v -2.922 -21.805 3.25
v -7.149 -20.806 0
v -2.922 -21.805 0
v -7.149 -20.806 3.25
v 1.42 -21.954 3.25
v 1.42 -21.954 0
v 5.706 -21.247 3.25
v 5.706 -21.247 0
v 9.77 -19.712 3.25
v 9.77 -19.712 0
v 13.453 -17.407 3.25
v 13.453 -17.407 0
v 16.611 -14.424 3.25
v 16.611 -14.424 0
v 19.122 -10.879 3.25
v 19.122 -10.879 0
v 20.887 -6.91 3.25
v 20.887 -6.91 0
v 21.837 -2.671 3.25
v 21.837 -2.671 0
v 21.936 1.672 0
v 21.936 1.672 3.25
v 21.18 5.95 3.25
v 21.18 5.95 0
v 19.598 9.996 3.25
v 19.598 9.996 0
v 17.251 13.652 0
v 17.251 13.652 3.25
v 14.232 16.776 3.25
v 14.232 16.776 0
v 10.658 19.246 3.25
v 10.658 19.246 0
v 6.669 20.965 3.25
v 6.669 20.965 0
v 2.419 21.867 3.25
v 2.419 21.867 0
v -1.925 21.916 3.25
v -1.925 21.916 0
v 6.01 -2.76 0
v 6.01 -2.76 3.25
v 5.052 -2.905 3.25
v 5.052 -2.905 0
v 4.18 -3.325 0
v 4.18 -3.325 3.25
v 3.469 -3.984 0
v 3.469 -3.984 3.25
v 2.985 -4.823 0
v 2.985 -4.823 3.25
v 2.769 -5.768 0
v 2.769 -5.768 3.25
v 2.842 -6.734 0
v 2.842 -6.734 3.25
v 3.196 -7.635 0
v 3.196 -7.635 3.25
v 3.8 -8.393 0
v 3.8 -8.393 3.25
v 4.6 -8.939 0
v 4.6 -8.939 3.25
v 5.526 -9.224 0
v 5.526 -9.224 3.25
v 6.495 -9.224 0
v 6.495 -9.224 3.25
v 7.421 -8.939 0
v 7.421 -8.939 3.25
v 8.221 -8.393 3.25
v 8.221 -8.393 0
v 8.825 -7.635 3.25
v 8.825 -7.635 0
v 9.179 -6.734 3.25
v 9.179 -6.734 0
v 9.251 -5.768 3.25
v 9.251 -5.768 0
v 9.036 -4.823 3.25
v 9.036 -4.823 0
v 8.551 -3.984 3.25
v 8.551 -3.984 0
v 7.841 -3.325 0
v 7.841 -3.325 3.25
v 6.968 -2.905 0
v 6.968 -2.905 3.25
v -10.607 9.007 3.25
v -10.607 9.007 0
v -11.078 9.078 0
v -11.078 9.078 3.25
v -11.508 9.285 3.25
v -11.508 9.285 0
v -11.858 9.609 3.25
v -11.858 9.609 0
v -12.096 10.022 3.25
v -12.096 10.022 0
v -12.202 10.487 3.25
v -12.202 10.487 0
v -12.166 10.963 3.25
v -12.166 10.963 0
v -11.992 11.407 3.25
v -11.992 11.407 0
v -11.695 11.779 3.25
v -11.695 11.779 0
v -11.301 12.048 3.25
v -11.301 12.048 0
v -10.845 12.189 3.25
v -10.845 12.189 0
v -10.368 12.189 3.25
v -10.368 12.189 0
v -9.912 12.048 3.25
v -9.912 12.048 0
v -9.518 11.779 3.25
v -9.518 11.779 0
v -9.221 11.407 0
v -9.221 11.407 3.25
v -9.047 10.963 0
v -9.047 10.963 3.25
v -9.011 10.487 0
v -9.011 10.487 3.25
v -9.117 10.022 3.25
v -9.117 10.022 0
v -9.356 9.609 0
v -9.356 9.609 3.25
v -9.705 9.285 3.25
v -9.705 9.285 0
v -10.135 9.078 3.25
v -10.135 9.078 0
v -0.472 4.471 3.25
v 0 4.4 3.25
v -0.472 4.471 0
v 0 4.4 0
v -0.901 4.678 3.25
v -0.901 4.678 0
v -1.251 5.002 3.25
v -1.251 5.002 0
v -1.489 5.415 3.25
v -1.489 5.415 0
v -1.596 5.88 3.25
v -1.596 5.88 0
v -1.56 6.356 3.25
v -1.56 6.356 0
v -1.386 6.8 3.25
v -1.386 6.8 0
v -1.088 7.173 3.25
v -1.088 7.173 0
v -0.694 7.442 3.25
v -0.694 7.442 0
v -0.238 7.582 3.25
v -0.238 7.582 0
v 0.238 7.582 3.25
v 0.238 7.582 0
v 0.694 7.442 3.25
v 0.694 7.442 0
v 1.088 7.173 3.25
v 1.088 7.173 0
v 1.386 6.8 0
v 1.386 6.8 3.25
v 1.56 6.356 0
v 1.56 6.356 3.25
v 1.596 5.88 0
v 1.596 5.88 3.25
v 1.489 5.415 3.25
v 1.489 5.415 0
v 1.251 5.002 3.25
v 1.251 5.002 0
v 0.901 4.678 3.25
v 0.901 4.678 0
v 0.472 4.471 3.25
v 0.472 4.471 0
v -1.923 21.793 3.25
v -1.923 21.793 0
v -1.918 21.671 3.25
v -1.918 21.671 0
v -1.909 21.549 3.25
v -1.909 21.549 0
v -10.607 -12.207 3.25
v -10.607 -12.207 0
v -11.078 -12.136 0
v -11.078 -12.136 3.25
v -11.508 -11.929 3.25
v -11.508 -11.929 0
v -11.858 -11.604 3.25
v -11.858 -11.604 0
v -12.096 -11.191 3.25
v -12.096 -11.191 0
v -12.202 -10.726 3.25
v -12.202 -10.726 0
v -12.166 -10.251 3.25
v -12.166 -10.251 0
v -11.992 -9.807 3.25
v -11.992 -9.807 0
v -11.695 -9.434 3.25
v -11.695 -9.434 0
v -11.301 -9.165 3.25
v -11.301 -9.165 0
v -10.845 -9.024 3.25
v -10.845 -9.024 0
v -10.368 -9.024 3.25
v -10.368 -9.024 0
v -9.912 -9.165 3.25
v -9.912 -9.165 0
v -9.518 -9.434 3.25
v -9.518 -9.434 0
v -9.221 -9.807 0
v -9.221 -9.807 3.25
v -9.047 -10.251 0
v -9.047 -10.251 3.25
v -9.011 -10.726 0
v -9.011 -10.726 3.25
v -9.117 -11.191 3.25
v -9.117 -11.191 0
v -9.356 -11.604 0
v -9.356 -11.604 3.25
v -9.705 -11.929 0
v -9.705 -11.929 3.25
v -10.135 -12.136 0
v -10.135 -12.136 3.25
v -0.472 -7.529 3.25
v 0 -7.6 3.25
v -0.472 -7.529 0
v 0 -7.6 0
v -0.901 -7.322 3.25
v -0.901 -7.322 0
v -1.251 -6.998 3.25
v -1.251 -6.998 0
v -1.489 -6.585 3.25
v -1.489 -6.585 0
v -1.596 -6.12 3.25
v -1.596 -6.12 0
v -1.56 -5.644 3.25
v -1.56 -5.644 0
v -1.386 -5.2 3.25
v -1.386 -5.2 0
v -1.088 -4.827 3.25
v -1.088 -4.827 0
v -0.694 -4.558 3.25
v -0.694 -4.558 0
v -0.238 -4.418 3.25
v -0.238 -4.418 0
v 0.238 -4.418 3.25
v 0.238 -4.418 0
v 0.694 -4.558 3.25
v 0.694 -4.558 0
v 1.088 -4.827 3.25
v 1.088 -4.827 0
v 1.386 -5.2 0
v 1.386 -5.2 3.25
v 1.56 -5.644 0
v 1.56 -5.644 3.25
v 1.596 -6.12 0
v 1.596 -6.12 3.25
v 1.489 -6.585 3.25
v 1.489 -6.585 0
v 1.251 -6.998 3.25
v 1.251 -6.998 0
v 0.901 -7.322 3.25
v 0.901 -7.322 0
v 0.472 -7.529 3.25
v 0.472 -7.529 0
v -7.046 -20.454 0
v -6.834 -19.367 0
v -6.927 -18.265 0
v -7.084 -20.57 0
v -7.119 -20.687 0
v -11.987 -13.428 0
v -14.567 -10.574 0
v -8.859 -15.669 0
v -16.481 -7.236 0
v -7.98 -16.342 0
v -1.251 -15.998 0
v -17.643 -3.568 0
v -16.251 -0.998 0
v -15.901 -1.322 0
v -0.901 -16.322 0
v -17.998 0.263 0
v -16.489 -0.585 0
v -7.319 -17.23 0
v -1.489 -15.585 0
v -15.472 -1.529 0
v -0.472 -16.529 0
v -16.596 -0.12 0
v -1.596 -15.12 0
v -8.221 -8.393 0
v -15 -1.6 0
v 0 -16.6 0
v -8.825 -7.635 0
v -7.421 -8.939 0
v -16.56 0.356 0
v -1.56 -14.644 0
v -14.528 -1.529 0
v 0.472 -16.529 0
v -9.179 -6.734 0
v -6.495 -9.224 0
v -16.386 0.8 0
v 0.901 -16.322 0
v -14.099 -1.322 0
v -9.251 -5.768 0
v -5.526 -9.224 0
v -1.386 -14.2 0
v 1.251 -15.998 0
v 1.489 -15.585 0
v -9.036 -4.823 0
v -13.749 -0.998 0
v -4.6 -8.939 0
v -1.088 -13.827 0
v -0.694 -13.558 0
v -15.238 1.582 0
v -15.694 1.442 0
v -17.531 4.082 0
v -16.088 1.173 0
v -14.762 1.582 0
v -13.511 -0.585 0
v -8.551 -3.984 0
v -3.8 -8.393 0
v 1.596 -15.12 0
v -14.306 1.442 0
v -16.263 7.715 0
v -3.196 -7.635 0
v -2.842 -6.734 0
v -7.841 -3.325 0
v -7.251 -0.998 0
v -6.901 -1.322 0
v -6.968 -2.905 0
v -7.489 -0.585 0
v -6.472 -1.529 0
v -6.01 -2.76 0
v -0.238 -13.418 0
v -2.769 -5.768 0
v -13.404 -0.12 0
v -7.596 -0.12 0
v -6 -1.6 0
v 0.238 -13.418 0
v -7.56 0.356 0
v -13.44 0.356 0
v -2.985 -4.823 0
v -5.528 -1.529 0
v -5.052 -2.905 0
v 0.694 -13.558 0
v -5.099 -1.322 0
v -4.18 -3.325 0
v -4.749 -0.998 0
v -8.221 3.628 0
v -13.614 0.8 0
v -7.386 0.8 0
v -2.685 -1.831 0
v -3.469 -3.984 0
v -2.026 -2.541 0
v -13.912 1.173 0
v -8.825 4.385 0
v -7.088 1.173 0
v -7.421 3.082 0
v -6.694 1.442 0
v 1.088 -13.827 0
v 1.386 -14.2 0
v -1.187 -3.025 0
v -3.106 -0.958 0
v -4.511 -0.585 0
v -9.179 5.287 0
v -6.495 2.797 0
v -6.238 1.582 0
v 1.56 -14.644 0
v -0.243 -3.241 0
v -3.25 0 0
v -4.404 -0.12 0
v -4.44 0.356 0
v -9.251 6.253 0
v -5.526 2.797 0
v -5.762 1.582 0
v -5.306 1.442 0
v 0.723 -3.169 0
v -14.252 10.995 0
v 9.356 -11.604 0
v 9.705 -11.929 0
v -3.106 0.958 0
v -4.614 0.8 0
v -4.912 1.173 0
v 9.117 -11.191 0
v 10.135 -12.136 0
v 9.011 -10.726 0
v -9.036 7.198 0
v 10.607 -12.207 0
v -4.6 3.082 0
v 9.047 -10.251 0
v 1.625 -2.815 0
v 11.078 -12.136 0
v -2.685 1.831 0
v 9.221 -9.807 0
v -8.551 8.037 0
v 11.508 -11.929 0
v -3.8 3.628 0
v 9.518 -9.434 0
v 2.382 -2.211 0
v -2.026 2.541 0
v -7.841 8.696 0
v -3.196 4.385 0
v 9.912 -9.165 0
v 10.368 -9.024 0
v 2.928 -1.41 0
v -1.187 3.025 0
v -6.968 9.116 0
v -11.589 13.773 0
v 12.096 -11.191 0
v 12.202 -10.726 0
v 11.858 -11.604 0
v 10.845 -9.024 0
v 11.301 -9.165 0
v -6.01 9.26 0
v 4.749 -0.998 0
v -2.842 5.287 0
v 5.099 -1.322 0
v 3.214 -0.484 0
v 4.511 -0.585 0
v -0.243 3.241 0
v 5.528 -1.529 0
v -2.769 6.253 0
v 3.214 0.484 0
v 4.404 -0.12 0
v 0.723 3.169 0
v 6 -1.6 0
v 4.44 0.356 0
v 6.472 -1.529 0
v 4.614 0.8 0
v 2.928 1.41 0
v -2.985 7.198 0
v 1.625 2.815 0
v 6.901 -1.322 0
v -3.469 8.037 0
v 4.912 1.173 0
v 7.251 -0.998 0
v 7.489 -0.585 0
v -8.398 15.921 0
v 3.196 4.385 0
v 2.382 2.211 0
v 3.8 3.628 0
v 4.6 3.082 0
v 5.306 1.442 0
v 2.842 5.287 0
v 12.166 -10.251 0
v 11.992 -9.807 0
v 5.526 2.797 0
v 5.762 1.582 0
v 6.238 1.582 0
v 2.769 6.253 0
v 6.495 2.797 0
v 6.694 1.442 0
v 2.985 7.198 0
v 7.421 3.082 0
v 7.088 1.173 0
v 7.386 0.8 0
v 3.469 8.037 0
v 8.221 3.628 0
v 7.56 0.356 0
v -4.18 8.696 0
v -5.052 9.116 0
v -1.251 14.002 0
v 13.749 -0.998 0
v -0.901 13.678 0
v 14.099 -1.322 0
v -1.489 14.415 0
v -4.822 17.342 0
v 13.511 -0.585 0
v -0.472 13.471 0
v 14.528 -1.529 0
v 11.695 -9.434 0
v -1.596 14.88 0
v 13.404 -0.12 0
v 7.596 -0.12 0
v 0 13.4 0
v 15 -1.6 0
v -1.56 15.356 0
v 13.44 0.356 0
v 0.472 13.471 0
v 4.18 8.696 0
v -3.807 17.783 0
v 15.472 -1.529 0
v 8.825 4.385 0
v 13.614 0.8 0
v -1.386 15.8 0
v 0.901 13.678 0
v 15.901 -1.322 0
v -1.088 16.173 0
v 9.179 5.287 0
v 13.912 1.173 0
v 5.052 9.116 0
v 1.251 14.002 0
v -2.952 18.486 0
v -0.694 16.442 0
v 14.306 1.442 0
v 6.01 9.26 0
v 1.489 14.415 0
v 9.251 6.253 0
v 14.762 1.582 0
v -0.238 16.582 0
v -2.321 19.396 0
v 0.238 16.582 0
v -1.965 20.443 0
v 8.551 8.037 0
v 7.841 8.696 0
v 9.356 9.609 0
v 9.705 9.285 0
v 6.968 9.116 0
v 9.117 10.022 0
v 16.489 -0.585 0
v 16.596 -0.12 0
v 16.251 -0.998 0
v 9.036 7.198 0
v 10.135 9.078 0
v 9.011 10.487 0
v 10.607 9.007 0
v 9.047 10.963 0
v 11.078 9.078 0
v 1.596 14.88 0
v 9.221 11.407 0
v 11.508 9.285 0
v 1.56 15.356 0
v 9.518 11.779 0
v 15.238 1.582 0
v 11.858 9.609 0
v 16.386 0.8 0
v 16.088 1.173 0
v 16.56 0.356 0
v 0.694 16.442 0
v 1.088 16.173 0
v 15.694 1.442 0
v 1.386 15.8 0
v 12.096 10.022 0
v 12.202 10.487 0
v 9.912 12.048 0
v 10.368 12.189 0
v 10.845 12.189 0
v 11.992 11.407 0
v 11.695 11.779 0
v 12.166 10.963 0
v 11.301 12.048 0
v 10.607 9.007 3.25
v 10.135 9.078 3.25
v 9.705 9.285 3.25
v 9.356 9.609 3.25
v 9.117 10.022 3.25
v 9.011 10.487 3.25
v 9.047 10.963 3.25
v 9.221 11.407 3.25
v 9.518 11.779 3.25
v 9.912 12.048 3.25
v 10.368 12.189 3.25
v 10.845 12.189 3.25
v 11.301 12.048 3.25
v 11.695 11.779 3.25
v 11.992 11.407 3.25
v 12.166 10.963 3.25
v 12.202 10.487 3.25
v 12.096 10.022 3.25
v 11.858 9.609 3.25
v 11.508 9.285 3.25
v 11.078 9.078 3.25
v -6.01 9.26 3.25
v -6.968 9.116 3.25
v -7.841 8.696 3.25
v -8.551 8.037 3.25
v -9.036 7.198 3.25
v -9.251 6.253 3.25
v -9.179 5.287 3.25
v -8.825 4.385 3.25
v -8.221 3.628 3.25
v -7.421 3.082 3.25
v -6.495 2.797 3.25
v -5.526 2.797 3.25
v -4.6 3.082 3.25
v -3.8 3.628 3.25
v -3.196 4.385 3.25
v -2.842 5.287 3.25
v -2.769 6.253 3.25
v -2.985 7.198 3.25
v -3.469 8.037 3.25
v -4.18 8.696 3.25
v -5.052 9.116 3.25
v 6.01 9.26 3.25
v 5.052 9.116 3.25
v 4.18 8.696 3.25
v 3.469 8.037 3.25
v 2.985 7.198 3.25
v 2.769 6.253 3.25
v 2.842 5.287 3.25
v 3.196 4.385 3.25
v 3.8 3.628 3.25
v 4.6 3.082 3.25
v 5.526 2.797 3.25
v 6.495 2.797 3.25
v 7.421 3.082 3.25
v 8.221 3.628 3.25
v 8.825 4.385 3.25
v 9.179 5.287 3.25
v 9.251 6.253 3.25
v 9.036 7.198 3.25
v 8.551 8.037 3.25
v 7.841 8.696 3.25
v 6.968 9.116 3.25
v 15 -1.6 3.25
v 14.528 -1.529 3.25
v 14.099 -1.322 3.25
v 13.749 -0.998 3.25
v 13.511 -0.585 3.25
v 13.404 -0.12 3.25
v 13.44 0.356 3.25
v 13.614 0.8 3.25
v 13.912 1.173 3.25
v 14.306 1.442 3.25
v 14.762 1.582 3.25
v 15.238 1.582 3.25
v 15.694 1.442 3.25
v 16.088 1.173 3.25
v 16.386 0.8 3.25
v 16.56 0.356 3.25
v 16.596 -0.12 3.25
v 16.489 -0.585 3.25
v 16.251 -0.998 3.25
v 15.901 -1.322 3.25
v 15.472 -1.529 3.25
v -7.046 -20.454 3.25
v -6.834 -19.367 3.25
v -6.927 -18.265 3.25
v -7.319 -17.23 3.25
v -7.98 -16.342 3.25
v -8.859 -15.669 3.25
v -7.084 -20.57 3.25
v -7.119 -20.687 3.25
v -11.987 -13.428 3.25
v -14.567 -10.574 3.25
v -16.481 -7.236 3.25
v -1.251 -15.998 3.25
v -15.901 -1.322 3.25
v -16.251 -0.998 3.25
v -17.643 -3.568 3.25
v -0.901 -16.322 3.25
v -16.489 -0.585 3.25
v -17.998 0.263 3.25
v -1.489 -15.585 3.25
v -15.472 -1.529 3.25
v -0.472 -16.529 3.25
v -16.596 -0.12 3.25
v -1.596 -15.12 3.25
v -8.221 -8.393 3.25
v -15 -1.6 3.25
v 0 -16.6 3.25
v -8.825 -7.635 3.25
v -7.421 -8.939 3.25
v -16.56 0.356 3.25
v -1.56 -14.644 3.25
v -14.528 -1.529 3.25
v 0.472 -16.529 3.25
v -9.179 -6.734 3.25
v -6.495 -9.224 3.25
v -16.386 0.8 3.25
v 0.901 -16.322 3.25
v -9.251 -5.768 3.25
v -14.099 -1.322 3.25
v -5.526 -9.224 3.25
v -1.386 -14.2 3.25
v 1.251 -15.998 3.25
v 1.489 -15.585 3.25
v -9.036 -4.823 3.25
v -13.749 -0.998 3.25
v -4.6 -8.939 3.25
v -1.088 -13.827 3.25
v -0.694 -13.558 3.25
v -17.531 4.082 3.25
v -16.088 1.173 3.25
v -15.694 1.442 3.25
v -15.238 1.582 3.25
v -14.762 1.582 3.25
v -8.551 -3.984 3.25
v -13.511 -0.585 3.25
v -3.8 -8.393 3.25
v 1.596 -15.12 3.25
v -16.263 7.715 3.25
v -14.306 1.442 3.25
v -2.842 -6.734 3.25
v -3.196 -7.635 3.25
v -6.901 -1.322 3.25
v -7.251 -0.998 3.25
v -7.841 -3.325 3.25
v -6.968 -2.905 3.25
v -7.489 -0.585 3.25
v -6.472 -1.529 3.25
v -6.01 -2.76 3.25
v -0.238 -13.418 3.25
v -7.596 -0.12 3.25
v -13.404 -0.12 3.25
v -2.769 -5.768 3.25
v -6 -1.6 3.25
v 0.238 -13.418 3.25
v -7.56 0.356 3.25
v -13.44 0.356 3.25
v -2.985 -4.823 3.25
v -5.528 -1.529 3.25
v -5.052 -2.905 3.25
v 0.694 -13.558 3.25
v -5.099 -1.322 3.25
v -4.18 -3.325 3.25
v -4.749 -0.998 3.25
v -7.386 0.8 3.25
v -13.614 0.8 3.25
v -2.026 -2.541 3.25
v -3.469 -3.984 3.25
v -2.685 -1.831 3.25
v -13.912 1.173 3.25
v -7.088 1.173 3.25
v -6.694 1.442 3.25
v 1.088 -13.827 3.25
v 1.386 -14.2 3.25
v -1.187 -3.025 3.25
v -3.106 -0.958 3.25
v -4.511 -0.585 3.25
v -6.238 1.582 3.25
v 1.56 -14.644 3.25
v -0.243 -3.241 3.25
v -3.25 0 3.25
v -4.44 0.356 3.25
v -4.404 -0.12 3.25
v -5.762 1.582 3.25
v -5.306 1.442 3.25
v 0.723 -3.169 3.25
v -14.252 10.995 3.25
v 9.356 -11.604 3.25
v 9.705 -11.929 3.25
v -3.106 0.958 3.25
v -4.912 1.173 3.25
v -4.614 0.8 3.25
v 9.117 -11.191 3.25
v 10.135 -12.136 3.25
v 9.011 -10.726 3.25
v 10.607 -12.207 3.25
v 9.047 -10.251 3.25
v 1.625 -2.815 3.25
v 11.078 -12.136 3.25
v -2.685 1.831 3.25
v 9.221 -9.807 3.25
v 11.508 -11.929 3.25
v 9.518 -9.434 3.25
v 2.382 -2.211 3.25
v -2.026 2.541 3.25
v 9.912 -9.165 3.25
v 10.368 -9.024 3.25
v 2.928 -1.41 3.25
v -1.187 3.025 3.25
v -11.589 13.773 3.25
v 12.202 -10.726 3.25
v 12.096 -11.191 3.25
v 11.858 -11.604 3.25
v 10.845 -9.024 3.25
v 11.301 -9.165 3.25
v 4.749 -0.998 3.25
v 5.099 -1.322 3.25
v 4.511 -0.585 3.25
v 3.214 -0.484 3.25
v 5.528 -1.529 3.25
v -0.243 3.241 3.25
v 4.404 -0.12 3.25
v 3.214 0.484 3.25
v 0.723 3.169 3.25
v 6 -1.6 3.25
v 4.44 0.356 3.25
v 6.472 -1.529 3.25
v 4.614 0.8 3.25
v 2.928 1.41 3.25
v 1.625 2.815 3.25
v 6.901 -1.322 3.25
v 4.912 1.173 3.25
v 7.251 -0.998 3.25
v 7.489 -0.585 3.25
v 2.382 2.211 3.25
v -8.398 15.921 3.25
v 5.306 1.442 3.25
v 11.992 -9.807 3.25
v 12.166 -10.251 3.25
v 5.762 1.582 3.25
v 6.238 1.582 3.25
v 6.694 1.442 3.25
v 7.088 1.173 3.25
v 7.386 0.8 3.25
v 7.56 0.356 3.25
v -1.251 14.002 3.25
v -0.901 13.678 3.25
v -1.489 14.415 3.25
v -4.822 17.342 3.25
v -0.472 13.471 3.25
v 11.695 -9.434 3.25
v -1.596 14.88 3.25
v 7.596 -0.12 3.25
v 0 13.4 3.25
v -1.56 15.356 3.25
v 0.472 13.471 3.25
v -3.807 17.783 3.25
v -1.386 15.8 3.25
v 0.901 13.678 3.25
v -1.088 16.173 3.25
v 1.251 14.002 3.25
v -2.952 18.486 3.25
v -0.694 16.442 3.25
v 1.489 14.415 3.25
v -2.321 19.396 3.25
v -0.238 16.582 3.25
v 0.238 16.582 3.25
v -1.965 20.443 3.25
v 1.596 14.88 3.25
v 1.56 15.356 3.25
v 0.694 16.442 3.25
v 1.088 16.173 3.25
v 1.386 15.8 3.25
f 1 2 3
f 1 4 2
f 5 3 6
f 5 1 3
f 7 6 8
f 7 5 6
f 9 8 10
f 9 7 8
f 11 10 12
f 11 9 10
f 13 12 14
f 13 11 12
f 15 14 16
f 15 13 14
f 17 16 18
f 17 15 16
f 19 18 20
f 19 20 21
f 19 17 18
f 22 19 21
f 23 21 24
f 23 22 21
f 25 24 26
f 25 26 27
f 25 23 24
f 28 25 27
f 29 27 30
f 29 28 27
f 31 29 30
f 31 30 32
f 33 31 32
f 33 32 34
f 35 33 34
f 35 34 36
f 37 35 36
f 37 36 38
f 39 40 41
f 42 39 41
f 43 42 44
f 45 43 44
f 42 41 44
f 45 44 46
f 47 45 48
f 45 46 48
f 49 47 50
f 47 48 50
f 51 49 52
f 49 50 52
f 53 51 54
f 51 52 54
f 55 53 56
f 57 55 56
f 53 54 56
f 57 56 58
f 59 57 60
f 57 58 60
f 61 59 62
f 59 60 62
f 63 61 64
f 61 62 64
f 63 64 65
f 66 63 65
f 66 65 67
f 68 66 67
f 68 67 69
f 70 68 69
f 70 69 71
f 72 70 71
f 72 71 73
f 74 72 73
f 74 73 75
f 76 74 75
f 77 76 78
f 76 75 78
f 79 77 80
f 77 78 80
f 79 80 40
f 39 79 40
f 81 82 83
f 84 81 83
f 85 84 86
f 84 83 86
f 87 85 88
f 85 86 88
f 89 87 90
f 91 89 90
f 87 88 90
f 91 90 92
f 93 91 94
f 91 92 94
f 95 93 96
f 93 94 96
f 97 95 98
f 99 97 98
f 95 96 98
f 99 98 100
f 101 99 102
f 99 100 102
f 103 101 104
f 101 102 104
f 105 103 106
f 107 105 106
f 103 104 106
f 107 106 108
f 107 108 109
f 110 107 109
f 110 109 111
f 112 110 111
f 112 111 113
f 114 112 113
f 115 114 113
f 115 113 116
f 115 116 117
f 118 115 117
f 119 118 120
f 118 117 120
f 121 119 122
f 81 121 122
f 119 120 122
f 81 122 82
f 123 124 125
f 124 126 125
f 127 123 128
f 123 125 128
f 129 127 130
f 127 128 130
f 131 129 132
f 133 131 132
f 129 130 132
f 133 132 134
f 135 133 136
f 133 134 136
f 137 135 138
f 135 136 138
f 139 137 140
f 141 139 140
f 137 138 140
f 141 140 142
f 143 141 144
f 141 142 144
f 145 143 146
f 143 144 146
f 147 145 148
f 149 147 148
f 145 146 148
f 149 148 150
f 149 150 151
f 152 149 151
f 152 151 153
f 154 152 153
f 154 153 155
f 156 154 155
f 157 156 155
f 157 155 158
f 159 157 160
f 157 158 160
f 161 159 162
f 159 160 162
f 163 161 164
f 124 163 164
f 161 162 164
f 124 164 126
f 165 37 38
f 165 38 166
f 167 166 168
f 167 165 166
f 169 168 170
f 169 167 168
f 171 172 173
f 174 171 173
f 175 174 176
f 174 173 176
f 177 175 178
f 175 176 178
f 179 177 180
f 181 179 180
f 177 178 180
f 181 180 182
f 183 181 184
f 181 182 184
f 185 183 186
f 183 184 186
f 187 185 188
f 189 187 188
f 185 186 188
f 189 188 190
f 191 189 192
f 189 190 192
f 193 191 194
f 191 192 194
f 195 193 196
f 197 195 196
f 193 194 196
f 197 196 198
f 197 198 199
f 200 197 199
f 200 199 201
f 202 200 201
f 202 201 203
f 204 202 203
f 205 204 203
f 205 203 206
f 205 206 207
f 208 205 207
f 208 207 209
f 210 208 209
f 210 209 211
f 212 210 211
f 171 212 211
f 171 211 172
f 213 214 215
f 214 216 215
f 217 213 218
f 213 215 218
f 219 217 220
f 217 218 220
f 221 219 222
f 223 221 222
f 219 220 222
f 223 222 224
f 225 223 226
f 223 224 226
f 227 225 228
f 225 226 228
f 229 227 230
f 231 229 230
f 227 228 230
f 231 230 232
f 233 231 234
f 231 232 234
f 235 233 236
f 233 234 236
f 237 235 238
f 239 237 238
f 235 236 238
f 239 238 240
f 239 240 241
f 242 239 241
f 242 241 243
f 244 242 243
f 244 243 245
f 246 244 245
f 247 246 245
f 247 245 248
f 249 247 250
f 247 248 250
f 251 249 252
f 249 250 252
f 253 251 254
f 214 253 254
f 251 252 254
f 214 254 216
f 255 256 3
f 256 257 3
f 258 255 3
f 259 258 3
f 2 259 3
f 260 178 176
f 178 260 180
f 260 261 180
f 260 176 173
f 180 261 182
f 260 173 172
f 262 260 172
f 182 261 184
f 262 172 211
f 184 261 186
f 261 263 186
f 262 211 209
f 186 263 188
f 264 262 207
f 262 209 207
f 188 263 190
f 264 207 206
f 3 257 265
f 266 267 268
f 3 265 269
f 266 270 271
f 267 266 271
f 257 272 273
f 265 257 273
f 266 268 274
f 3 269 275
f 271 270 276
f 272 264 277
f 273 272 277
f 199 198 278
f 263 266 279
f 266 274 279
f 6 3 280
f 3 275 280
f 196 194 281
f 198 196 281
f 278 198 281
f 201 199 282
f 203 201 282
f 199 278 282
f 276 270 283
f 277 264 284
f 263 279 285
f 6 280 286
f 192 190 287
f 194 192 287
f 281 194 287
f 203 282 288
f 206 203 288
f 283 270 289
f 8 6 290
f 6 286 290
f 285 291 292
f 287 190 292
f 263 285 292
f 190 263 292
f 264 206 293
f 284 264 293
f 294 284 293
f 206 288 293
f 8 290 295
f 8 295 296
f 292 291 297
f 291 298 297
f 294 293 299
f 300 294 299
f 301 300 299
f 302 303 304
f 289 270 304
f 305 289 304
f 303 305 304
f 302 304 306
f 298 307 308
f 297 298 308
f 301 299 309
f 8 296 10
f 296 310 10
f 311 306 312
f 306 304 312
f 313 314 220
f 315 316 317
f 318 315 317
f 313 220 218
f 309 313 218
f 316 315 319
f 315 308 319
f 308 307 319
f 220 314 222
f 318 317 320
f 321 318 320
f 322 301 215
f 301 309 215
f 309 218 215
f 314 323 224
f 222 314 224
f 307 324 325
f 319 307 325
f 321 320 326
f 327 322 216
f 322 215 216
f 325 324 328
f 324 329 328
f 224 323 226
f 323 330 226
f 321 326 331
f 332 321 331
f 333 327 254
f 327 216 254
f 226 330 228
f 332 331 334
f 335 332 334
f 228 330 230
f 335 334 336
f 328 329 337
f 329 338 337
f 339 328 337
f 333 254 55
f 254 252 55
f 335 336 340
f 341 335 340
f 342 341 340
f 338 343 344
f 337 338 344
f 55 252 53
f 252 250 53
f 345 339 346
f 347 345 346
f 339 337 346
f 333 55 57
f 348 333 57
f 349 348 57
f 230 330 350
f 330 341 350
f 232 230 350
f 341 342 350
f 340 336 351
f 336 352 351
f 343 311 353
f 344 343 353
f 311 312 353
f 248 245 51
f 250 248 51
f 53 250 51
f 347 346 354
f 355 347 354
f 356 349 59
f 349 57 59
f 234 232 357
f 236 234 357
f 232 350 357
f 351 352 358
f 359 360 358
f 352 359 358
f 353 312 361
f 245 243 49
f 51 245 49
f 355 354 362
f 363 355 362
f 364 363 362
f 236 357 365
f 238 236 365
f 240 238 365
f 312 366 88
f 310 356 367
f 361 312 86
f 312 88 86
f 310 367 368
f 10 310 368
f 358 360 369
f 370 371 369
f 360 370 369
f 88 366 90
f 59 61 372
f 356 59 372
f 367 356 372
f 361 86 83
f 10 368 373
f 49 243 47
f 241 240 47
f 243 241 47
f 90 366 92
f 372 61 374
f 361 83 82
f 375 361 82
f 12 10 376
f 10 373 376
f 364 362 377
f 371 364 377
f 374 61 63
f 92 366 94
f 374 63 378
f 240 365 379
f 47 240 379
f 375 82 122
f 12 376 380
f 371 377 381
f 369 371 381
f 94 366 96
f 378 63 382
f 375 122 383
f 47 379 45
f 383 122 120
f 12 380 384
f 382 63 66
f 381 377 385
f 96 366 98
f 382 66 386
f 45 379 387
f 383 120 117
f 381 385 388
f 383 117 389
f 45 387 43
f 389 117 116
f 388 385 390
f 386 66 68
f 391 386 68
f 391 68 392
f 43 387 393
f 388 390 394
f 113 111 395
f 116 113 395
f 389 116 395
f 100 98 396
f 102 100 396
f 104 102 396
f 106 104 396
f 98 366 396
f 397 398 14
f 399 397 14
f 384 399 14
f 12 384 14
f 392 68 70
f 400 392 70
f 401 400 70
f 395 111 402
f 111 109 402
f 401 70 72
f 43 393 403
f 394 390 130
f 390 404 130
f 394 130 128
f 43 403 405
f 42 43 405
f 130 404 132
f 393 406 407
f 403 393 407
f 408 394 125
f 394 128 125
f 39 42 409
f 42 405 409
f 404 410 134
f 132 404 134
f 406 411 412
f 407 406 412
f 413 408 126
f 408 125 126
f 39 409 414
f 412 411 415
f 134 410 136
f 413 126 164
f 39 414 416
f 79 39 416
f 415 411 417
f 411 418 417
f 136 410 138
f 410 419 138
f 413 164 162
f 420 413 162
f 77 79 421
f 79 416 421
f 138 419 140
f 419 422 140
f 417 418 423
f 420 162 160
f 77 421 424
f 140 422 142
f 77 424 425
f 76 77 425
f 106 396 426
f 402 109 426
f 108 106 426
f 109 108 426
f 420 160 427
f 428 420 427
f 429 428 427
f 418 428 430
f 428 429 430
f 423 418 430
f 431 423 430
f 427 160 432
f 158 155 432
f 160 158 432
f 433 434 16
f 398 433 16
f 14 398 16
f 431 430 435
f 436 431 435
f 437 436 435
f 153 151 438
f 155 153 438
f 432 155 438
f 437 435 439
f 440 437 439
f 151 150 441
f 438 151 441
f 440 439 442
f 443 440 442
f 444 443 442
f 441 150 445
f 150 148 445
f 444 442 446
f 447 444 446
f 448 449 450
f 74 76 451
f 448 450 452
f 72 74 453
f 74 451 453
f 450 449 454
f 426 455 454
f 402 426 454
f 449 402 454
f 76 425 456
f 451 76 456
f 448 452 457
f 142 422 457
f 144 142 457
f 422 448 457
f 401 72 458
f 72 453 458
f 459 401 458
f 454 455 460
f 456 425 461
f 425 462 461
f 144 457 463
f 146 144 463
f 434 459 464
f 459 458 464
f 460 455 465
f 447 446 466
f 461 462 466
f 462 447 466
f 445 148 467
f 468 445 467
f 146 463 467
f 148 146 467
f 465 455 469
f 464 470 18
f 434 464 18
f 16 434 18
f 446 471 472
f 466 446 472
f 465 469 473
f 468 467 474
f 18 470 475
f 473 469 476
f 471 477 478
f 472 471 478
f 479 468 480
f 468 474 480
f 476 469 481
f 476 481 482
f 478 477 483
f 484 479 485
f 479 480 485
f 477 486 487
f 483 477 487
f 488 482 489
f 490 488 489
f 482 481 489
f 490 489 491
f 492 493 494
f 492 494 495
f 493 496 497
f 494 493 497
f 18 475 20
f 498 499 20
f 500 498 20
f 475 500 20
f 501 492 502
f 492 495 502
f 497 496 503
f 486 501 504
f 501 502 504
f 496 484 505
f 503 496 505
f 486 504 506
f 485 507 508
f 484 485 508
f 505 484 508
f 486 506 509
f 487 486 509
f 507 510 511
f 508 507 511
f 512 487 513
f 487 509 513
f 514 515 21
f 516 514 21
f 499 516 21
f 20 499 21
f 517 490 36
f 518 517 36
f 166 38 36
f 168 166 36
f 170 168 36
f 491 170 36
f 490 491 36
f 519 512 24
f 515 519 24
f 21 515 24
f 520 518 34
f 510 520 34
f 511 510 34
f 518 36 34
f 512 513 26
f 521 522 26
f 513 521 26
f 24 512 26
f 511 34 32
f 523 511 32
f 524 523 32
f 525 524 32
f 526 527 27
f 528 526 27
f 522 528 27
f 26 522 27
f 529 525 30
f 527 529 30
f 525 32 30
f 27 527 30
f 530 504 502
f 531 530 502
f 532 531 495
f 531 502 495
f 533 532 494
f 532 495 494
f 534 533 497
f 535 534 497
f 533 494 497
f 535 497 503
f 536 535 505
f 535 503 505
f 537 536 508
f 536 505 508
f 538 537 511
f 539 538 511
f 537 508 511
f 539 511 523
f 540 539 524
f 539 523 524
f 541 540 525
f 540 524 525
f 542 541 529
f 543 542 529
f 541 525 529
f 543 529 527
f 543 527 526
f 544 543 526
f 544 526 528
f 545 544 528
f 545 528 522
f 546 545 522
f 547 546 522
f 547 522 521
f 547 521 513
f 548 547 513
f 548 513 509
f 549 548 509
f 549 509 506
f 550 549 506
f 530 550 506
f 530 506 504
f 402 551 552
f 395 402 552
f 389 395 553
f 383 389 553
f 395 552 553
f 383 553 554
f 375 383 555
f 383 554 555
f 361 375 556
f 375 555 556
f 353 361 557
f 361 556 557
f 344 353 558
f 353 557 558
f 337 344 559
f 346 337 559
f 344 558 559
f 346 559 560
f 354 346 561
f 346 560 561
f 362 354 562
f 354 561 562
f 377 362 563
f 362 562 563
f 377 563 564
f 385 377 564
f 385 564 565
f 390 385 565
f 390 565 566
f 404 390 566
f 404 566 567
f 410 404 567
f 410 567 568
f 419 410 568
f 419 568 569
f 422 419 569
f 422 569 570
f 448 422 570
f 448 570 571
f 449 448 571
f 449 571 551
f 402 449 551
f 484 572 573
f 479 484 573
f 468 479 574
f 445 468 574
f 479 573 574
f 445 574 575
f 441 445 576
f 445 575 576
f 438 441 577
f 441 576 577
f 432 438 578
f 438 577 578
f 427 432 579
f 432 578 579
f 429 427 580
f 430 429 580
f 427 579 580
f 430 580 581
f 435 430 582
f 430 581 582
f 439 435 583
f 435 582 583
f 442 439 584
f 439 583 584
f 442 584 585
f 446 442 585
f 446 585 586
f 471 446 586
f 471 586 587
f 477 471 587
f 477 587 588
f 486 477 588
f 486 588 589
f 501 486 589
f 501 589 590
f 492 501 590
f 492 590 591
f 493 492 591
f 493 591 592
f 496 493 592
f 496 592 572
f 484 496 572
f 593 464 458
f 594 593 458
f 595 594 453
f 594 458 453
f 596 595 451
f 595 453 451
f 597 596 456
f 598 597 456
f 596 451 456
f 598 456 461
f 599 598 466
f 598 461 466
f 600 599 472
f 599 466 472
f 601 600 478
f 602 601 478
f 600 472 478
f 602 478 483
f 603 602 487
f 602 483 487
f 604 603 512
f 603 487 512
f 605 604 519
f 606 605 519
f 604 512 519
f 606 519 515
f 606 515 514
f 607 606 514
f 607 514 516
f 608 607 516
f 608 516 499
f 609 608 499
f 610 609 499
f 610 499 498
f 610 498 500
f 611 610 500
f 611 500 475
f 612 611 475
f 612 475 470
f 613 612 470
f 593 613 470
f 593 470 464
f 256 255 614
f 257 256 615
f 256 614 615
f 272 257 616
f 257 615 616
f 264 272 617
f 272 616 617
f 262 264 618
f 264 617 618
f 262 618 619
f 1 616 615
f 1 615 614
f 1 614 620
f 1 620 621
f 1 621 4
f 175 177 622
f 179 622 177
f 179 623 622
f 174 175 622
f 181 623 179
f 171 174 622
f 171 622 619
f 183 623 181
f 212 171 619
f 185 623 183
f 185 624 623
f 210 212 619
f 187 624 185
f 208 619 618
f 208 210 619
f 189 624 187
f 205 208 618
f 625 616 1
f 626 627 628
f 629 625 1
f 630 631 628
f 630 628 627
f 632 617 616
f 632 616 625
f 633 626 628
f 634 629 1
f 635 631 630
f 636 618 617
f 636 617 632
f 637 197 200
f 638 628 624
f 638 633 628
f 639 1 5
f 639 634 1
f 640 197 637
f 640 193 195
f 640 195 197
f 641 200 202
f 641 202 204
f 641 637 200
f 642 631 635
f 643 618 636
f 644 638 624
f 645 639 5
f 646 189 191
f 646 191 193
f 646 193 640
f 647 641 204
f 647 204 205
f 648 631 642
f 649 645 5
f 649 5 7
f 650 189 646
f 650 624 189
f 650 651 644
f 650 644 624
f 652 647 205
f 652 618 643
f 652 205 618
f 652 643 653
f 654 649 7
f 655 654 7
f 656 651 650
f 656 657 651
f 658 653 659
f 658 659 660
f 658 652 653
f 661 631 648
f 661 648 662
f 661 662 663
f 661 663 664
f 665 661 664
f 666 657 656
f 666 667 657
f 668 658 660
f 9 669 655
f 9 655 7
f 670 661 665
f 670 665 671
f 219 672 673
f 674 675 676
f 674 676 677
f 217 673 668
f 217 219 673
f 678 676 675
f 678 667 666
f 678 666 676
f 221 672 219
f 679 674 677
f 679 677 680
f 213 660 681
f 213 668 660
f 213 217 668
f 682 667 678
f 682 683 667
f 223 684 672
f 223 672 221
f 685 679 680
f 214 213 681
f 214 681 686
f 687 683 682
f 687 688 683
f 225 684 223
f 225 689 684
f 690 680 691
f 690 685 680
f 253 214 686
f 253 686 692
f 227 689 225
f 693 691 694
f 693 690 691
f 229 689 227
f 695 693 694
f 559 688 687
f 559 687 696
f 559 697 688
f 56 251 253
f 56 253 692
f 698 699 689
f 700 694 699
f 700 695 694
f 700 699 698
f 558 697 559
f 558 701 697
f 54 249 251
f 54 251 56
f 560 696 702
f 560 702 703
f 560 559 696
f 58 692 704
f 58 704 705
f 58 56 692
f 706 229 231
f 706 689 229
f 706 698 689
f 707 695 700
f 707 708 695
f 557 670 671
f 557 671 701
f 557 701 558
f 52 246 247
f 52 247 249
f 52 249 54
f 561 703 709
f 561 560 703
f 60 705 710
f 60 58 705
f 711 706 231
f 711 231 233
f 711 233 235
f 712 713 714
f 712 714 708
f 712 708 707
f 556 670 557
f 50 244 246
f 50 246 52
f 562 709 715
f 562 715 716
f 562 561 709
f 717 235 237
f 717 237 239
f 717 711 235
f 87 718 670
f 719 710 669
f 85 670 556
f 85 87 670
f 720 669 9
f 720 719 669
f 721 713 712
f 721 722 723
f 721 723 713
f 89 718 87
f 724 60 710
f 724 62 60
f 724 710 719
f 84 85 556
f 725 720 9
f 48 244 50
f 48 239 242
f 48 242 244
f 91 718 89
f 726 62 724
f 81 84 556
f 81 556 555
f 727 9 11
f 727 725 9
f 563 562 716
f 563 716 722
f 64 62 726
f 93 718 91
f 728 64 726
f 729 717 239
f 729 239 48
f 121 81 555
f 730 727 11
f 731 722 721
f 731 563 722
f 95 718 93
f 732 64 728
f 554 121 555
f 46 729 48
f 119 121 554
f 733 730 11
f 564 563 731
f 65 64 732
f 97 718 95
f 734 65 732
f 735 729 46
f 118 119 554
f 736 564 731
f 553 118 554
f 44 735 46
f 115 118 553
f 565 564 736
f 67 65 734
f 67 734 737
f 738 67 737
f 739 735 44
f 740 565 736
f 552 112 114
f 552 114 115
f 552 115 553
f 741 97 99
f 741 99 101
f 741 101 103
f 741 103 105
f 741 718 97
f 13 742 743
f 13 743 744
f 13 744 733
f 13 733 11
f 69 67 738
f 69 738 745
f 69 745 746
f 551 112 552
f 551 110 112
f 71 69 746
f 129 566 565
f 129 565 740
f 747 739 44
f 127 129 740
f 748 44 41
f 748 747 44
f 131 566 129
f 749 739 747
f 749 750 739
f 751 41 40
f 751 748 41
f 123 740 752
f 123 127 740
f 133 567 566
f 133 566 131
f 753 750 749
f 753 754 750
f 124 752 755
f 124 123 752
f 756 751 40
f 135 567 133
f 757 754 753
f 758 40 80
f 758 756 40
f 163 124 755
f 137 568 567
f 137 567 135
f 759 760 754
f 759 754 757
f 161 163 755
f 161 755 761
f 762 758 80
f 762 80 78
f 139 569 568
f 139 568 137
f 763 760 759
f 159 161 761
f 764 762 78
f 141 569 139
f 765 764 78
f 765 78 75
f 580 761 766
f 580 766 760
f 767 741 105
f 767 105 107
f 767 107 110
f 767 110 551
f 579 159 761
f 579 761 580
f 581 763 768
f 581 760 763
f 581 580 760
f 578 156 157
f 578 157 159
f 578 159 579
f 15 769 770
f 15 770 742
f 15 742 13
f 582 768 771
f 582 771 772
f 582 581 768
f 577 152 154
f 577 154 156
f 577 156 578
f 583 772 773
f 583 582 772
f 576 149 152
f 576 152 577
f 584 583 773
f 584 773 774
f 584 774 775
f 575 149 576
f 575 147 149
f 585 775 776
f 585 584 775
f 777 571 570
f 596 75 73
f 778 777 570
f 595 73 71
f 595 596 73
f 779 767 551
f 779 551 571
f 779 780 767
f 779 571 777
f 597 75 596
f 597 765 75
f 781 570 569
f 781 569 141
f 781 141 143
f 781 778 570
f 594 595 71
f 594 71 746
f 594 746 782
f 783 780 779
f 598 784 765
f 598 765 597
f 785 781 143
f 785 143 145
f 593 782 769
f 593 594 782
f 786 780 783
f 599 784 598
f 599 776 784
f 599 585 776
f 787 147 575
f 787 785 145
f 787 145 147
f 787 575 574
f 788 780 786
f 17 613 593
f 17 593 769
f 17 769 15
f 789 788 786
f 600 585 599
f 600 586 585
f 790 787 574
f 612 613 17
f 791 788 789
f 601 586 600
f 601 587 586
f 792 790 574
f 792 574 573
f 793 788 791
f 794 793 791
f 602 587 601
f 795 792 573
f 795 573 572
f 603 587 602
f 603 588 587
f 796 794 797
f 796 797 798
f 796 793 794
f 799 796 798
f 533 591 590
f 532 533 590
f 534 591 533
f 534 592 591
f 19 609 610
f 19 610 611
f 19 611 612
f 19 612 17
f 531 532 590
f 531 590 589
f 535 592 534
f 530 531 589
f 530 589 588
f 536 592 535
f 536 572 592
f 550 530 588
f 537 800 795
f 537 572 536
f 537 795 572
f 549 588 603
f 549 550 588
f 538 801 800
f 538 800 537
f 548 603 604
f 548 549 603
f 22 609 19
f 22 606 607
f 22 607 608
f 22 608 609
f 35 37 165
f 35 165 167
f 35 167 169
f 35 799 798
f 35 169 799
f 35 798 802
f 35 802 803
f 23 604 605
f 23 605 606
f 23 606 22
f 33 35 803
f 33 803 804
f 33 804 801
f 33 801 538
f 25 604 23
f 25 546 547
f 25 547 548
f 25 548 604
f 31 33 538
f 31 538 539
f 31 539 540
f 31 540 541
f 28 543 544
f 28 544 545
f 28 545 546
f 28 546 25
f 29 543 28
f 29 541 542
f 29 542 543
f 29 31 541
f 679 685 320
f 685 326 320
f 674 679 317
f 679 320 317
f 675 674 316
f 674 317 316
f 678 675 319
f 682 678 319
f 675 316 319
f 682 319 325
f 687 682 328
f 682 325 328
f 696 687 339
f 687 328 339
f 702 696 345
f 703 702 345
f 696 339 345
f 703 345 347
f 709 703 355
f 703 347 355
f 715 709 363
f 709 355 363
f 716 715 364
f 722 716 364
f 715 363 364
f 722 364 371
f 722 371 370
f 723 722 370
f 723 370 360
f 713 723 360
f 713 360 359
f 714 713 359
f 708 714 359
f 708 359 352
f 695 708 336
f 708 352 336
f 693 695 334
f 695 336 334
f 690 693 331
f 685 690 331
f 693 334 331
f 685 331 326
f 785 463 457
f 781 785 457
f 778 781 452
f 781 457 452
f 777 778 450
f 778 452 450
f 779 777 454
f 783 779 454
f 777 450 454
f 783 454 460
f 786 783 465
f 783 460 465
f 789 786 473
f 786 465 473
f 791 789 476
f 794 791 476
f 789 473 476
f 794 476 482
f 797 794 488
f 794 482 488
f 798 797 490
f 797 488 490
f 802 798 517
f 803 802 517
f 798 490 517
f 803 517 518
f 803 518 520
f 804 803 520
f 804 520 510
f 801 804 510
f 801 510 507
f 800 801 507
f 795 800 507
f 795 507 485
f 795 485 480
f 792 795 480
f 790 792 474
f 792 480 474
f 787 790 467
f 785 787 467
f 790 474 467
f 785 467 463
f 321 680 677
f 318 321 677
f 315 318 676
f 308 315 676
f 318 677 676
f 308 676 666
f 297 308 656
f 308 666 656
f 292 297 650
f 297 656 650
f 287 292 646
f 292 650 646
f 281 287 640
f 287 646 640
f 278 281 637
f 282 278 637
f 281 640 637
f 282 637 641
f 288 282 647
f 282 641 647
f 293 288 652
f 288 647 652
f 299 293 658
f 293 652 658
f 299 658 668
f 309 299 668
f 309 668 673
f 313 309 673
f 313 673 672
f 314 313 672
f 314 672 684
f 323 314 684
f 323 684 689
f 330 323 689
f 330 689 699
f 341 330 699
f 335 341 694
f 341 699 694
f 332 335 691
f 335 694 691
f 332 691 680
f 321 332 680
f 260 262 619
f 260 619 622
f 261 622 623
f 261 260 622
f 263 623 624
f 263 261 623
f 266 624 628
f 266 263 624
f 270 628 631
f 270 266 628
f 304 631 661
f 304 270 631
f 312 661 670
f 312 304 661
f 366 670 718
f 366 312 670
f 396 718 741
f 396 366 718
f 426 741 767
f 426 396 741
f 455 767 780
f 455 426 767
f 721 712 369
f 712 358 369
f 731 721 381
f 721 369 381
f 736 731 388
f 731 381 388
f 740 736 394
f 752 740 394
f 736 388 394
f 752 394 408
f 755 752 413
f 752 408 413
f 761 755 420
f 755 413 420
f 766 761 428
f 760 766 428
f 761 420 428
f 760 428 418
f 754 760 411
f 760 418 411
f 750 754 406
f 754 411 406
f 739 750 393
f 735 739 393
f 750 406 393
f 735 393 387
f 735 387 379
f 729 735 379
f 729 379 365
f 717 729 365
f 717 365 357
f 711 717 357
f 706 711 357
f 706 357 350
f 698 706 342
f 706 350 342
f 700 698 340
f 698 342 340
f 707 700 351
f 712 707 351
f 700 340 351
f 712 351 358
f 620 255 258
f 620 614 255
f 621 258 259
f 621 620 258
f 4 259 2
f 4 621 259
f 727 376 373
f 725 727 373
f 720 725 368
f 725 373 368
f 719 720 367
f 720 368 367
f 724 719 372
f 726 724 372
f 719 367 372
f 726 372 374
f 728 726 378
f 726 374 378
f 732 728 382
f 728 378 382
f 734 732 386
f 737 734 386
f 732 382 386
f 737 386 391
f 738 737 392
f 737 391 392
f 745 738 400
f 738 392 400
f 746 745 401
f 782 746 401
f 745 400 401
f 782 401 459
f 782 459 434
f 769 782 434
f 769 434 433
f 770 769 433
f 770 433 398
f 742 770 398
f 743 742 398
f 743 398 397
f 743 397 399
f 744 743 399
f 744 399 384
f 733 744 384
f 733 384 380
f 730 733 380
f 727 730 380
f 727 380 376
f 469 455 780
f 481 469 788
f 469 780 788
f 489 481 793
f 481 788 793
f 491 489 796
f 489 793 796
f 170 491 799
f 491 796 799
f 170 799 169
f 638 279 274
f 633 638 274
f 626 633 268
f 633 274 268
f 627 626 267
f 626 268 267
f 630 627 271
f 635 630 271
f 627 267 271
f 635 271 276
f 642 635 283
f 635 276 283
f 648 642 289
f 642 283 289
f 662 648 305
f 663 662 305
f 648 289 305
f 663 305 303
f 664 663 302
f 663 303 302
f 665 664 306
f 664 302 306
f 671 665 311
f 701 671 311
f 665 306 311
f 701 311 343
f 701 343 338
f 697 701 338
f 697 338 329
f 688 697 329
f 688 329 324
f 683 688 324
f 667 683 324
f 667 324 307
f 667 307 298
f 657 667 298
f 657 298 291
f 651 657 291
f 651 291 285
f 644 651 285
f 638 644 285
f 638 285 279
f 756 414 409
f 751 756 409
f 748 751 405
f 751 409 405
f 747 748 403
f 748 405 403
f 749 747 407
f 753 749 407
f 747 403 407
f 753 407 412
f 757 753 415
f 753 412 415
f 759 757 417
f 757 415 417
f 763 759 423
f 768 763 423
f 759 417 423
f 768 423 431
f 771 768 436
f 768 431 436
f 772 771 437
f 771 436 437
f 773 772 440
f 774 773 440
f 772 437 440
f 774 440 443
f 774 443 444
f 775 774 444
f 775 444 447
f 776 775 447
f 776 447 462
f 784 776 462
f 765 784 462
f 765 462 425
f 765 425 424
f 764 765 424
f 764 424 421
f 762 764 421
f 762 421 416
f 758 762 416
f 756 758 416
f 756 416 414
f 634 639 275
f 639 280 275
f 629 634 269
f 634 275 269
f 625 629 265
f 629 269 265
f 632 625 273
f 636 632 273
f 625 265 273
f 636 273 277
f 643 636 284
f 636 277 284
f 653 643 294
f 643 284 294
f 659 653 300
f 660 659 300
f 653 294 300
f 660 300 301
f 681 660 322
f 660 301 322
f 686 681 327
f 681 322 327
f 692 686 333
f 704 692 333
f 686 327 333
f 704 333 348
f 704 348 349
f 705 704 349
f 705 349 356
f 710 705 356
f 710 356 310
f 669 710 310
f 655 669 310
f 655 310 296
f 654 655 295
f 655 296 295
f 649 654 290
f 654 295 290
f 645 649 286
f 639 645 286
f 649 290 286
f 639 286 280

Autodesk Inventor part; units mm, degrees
ref_plane "YZ Plane" through (0, 0, 0) normal (1, 0, 0) x (0, 1, 0)
ref_plane "XZ Plane" through (0, 0, 0) normal (0, 1, 0) x (-1, 0, 0)
ref_plane "XY Plane" through (0, 0, 0) normal (0, 0, 1) x (1, 0, 0)
sketch "スケッチ1" plane through (0, 0, 0) normal (0, 0, 1) x (1, 0, 0)
  circle A0 centre (0, 0) radius 18
  dimension "d0" = 36
extrude "押し出し1" add sketch "スケッチ1" along normal blind 3.25
sketch "スケッチ2" plane through (0, 0, 3.25) normal (0, 0, 1) x (1, 0, 0)
  circle A0 centre (0, 0) radius 6
  point P0 (0, 6)
  point P1 (-6, 0)
  point P2 (0, -6)
  point P3 (6, 0)
  dimension "d3" = 12
  dimension "d6" = 360
hole "穴1" at (0, 6, 3.25) at (-6, 0, 3.25) at (0, -6, 3.25) at (6, 0, 3.25) direction (0, 0, -1) diameter 3.2 end through all clearance for "Socket Head Cap Screw" size "M3" standard "Ansi Metric M Profile"
sketch "スケッチ3" plane through (0, 0, 0) normal (0, 0, -1) x (-1, 0, 0)
  circle A0 centre (0, 0) radius 8.5
  point P0 (-6.0104, 6.0104)
  point P1 (-6.0104, -6.0104)
  point P2 (6.0104, -6.0104)
  point P3 (6.0104, 6.0104)
  dimension "d15" = 17
  dimension "d18" = 360
hole "穴2" at (6.0104, 6.0104, 0) at (6.0104, -6.0104, 0) at (-6.0104, -6.0104, 0) at (-6.0104, 6.0104, 0) direction (0, 0, 1) diameter 3.2 end through all counterbore diameter 6.5 counterbore depth 10 clearance for "Socket Head Cap Screw" size "M3" standard "Ansi Metric M Profile"
sketch "スケッチ4" plane through (0, 0, 0) normal (0, 0, -1) x (-1, 0, 0)
  circle A0 centre (0, 0) radius 3.25
  dimension "d27" = 6.5
extrude "押し出し2" cut sketch "スケッチ4" against normal blind 8
sketch "スケッチ5" plane through (0, 0, 3.25) normal (0, 0, 1) x (1, 0, 0)
  circle A0 centre (0, 0) radius 15
  point P0 (0, -15)
  point P1 (10.6066, -10.6066)
  point P2 (15, 0)
  point P3 (10.6066, 10.6066)
  point P4 (0, 15)
  point P5 (-10.6066, 10.6066)
  point P6 (-15, 0)
  point P7 (-10.6066, -10.6066)
  dimension "d31" = 30
  dimension "d34" = 360
hole "穴3" at (0, -15, 3.25) at (10.6066, -10.6066, 3.25) at (15, 0, 3.25) at (10.6066, 10.6066, 3.25) at (0, 15, 3.25) at (-10.6066, 10.6066, 3.25) at (-15, 0, 3.25) at (-10.6066, -10.6066, 3.25) direction (0, 0, -1) diameter 3.2 end through all clearance for "Socket Head Cap Screw" size "M3" standard "Ansi Metric M Profile"
sketch "スケッチ7" plane through (0, 0, 3.25) normal (0, 0, 1) x (1, 0, 0)
  circle A0 centre (2.0753, 21.9019) radius 4
  circle A1 centre (-17, 14) radius 4 construction
  circle A2 centre (-3.264, -21.7565) radius 4
  circle A3 centre (0, 0) radius 18
  line L0 (-3.264, -21.7565) -> (0, 0) construction
  circle A4 centre (-20.8592, 6.9924) radius 4 construction
  circle A5 centre (-10.8624, 19.1313) radius 4 construction
  line L1 (-10.8624, 19.1313) -> (0, 0) construction
  line L2 (0, 0) -> (-20.8592, 6.9924) construction
  line L3 (0, 0) -> (2.0753, 21.9019) construction
  arc A6 (-3.8575, -25.7123) -> (2.4526, 25.8841) centre (0, 0) ccw
  circle A7 centre (0, 0) radius 18
  circle A8 centre (-5.8935, 21.1959) radius 4
  circle A9 centre (-10.8278, -19.1509) radius 4
  circle A10 centre (0, 0) radius 22
  point P0 (-1.9091, 21.5489)
  point P1 (-7.1494, -20.8059)
  point P2 (-4.822, 17.3421)
  point P3 (-8.8591, -15.669)
  point P4 (-7.0459, -20.4537)
  point P5 (-1.9247, 21.9156)
  point P6 (-1.9091, 21.5489)
  dimension "d57" = 44
  dimension "d46" = 17
  dimension "d47" = 14
  dimension "d48" = 8
  dimension "d49" = 8
  dimension "d50" = 8
  dimension "d51" = 8
  dimension "d52" = 8
  dimension "d53" = 35
  dimension "d54" = 100
  dimension "d55" = 8
  dimension "d56" = 8
extrude "押し出し4" add sketch "スケッチ7" against normal up to surface (3.25 mm away) contours A10 A2 A3 A0 | A0 A10 | A3 A8 A0 | A2 A10 | A9 A3 A2 picked at (1.947, 20.5476) picked at (-3.0622, -20.4112)
properties part number "s_base6" material "ABS プラスチック"
